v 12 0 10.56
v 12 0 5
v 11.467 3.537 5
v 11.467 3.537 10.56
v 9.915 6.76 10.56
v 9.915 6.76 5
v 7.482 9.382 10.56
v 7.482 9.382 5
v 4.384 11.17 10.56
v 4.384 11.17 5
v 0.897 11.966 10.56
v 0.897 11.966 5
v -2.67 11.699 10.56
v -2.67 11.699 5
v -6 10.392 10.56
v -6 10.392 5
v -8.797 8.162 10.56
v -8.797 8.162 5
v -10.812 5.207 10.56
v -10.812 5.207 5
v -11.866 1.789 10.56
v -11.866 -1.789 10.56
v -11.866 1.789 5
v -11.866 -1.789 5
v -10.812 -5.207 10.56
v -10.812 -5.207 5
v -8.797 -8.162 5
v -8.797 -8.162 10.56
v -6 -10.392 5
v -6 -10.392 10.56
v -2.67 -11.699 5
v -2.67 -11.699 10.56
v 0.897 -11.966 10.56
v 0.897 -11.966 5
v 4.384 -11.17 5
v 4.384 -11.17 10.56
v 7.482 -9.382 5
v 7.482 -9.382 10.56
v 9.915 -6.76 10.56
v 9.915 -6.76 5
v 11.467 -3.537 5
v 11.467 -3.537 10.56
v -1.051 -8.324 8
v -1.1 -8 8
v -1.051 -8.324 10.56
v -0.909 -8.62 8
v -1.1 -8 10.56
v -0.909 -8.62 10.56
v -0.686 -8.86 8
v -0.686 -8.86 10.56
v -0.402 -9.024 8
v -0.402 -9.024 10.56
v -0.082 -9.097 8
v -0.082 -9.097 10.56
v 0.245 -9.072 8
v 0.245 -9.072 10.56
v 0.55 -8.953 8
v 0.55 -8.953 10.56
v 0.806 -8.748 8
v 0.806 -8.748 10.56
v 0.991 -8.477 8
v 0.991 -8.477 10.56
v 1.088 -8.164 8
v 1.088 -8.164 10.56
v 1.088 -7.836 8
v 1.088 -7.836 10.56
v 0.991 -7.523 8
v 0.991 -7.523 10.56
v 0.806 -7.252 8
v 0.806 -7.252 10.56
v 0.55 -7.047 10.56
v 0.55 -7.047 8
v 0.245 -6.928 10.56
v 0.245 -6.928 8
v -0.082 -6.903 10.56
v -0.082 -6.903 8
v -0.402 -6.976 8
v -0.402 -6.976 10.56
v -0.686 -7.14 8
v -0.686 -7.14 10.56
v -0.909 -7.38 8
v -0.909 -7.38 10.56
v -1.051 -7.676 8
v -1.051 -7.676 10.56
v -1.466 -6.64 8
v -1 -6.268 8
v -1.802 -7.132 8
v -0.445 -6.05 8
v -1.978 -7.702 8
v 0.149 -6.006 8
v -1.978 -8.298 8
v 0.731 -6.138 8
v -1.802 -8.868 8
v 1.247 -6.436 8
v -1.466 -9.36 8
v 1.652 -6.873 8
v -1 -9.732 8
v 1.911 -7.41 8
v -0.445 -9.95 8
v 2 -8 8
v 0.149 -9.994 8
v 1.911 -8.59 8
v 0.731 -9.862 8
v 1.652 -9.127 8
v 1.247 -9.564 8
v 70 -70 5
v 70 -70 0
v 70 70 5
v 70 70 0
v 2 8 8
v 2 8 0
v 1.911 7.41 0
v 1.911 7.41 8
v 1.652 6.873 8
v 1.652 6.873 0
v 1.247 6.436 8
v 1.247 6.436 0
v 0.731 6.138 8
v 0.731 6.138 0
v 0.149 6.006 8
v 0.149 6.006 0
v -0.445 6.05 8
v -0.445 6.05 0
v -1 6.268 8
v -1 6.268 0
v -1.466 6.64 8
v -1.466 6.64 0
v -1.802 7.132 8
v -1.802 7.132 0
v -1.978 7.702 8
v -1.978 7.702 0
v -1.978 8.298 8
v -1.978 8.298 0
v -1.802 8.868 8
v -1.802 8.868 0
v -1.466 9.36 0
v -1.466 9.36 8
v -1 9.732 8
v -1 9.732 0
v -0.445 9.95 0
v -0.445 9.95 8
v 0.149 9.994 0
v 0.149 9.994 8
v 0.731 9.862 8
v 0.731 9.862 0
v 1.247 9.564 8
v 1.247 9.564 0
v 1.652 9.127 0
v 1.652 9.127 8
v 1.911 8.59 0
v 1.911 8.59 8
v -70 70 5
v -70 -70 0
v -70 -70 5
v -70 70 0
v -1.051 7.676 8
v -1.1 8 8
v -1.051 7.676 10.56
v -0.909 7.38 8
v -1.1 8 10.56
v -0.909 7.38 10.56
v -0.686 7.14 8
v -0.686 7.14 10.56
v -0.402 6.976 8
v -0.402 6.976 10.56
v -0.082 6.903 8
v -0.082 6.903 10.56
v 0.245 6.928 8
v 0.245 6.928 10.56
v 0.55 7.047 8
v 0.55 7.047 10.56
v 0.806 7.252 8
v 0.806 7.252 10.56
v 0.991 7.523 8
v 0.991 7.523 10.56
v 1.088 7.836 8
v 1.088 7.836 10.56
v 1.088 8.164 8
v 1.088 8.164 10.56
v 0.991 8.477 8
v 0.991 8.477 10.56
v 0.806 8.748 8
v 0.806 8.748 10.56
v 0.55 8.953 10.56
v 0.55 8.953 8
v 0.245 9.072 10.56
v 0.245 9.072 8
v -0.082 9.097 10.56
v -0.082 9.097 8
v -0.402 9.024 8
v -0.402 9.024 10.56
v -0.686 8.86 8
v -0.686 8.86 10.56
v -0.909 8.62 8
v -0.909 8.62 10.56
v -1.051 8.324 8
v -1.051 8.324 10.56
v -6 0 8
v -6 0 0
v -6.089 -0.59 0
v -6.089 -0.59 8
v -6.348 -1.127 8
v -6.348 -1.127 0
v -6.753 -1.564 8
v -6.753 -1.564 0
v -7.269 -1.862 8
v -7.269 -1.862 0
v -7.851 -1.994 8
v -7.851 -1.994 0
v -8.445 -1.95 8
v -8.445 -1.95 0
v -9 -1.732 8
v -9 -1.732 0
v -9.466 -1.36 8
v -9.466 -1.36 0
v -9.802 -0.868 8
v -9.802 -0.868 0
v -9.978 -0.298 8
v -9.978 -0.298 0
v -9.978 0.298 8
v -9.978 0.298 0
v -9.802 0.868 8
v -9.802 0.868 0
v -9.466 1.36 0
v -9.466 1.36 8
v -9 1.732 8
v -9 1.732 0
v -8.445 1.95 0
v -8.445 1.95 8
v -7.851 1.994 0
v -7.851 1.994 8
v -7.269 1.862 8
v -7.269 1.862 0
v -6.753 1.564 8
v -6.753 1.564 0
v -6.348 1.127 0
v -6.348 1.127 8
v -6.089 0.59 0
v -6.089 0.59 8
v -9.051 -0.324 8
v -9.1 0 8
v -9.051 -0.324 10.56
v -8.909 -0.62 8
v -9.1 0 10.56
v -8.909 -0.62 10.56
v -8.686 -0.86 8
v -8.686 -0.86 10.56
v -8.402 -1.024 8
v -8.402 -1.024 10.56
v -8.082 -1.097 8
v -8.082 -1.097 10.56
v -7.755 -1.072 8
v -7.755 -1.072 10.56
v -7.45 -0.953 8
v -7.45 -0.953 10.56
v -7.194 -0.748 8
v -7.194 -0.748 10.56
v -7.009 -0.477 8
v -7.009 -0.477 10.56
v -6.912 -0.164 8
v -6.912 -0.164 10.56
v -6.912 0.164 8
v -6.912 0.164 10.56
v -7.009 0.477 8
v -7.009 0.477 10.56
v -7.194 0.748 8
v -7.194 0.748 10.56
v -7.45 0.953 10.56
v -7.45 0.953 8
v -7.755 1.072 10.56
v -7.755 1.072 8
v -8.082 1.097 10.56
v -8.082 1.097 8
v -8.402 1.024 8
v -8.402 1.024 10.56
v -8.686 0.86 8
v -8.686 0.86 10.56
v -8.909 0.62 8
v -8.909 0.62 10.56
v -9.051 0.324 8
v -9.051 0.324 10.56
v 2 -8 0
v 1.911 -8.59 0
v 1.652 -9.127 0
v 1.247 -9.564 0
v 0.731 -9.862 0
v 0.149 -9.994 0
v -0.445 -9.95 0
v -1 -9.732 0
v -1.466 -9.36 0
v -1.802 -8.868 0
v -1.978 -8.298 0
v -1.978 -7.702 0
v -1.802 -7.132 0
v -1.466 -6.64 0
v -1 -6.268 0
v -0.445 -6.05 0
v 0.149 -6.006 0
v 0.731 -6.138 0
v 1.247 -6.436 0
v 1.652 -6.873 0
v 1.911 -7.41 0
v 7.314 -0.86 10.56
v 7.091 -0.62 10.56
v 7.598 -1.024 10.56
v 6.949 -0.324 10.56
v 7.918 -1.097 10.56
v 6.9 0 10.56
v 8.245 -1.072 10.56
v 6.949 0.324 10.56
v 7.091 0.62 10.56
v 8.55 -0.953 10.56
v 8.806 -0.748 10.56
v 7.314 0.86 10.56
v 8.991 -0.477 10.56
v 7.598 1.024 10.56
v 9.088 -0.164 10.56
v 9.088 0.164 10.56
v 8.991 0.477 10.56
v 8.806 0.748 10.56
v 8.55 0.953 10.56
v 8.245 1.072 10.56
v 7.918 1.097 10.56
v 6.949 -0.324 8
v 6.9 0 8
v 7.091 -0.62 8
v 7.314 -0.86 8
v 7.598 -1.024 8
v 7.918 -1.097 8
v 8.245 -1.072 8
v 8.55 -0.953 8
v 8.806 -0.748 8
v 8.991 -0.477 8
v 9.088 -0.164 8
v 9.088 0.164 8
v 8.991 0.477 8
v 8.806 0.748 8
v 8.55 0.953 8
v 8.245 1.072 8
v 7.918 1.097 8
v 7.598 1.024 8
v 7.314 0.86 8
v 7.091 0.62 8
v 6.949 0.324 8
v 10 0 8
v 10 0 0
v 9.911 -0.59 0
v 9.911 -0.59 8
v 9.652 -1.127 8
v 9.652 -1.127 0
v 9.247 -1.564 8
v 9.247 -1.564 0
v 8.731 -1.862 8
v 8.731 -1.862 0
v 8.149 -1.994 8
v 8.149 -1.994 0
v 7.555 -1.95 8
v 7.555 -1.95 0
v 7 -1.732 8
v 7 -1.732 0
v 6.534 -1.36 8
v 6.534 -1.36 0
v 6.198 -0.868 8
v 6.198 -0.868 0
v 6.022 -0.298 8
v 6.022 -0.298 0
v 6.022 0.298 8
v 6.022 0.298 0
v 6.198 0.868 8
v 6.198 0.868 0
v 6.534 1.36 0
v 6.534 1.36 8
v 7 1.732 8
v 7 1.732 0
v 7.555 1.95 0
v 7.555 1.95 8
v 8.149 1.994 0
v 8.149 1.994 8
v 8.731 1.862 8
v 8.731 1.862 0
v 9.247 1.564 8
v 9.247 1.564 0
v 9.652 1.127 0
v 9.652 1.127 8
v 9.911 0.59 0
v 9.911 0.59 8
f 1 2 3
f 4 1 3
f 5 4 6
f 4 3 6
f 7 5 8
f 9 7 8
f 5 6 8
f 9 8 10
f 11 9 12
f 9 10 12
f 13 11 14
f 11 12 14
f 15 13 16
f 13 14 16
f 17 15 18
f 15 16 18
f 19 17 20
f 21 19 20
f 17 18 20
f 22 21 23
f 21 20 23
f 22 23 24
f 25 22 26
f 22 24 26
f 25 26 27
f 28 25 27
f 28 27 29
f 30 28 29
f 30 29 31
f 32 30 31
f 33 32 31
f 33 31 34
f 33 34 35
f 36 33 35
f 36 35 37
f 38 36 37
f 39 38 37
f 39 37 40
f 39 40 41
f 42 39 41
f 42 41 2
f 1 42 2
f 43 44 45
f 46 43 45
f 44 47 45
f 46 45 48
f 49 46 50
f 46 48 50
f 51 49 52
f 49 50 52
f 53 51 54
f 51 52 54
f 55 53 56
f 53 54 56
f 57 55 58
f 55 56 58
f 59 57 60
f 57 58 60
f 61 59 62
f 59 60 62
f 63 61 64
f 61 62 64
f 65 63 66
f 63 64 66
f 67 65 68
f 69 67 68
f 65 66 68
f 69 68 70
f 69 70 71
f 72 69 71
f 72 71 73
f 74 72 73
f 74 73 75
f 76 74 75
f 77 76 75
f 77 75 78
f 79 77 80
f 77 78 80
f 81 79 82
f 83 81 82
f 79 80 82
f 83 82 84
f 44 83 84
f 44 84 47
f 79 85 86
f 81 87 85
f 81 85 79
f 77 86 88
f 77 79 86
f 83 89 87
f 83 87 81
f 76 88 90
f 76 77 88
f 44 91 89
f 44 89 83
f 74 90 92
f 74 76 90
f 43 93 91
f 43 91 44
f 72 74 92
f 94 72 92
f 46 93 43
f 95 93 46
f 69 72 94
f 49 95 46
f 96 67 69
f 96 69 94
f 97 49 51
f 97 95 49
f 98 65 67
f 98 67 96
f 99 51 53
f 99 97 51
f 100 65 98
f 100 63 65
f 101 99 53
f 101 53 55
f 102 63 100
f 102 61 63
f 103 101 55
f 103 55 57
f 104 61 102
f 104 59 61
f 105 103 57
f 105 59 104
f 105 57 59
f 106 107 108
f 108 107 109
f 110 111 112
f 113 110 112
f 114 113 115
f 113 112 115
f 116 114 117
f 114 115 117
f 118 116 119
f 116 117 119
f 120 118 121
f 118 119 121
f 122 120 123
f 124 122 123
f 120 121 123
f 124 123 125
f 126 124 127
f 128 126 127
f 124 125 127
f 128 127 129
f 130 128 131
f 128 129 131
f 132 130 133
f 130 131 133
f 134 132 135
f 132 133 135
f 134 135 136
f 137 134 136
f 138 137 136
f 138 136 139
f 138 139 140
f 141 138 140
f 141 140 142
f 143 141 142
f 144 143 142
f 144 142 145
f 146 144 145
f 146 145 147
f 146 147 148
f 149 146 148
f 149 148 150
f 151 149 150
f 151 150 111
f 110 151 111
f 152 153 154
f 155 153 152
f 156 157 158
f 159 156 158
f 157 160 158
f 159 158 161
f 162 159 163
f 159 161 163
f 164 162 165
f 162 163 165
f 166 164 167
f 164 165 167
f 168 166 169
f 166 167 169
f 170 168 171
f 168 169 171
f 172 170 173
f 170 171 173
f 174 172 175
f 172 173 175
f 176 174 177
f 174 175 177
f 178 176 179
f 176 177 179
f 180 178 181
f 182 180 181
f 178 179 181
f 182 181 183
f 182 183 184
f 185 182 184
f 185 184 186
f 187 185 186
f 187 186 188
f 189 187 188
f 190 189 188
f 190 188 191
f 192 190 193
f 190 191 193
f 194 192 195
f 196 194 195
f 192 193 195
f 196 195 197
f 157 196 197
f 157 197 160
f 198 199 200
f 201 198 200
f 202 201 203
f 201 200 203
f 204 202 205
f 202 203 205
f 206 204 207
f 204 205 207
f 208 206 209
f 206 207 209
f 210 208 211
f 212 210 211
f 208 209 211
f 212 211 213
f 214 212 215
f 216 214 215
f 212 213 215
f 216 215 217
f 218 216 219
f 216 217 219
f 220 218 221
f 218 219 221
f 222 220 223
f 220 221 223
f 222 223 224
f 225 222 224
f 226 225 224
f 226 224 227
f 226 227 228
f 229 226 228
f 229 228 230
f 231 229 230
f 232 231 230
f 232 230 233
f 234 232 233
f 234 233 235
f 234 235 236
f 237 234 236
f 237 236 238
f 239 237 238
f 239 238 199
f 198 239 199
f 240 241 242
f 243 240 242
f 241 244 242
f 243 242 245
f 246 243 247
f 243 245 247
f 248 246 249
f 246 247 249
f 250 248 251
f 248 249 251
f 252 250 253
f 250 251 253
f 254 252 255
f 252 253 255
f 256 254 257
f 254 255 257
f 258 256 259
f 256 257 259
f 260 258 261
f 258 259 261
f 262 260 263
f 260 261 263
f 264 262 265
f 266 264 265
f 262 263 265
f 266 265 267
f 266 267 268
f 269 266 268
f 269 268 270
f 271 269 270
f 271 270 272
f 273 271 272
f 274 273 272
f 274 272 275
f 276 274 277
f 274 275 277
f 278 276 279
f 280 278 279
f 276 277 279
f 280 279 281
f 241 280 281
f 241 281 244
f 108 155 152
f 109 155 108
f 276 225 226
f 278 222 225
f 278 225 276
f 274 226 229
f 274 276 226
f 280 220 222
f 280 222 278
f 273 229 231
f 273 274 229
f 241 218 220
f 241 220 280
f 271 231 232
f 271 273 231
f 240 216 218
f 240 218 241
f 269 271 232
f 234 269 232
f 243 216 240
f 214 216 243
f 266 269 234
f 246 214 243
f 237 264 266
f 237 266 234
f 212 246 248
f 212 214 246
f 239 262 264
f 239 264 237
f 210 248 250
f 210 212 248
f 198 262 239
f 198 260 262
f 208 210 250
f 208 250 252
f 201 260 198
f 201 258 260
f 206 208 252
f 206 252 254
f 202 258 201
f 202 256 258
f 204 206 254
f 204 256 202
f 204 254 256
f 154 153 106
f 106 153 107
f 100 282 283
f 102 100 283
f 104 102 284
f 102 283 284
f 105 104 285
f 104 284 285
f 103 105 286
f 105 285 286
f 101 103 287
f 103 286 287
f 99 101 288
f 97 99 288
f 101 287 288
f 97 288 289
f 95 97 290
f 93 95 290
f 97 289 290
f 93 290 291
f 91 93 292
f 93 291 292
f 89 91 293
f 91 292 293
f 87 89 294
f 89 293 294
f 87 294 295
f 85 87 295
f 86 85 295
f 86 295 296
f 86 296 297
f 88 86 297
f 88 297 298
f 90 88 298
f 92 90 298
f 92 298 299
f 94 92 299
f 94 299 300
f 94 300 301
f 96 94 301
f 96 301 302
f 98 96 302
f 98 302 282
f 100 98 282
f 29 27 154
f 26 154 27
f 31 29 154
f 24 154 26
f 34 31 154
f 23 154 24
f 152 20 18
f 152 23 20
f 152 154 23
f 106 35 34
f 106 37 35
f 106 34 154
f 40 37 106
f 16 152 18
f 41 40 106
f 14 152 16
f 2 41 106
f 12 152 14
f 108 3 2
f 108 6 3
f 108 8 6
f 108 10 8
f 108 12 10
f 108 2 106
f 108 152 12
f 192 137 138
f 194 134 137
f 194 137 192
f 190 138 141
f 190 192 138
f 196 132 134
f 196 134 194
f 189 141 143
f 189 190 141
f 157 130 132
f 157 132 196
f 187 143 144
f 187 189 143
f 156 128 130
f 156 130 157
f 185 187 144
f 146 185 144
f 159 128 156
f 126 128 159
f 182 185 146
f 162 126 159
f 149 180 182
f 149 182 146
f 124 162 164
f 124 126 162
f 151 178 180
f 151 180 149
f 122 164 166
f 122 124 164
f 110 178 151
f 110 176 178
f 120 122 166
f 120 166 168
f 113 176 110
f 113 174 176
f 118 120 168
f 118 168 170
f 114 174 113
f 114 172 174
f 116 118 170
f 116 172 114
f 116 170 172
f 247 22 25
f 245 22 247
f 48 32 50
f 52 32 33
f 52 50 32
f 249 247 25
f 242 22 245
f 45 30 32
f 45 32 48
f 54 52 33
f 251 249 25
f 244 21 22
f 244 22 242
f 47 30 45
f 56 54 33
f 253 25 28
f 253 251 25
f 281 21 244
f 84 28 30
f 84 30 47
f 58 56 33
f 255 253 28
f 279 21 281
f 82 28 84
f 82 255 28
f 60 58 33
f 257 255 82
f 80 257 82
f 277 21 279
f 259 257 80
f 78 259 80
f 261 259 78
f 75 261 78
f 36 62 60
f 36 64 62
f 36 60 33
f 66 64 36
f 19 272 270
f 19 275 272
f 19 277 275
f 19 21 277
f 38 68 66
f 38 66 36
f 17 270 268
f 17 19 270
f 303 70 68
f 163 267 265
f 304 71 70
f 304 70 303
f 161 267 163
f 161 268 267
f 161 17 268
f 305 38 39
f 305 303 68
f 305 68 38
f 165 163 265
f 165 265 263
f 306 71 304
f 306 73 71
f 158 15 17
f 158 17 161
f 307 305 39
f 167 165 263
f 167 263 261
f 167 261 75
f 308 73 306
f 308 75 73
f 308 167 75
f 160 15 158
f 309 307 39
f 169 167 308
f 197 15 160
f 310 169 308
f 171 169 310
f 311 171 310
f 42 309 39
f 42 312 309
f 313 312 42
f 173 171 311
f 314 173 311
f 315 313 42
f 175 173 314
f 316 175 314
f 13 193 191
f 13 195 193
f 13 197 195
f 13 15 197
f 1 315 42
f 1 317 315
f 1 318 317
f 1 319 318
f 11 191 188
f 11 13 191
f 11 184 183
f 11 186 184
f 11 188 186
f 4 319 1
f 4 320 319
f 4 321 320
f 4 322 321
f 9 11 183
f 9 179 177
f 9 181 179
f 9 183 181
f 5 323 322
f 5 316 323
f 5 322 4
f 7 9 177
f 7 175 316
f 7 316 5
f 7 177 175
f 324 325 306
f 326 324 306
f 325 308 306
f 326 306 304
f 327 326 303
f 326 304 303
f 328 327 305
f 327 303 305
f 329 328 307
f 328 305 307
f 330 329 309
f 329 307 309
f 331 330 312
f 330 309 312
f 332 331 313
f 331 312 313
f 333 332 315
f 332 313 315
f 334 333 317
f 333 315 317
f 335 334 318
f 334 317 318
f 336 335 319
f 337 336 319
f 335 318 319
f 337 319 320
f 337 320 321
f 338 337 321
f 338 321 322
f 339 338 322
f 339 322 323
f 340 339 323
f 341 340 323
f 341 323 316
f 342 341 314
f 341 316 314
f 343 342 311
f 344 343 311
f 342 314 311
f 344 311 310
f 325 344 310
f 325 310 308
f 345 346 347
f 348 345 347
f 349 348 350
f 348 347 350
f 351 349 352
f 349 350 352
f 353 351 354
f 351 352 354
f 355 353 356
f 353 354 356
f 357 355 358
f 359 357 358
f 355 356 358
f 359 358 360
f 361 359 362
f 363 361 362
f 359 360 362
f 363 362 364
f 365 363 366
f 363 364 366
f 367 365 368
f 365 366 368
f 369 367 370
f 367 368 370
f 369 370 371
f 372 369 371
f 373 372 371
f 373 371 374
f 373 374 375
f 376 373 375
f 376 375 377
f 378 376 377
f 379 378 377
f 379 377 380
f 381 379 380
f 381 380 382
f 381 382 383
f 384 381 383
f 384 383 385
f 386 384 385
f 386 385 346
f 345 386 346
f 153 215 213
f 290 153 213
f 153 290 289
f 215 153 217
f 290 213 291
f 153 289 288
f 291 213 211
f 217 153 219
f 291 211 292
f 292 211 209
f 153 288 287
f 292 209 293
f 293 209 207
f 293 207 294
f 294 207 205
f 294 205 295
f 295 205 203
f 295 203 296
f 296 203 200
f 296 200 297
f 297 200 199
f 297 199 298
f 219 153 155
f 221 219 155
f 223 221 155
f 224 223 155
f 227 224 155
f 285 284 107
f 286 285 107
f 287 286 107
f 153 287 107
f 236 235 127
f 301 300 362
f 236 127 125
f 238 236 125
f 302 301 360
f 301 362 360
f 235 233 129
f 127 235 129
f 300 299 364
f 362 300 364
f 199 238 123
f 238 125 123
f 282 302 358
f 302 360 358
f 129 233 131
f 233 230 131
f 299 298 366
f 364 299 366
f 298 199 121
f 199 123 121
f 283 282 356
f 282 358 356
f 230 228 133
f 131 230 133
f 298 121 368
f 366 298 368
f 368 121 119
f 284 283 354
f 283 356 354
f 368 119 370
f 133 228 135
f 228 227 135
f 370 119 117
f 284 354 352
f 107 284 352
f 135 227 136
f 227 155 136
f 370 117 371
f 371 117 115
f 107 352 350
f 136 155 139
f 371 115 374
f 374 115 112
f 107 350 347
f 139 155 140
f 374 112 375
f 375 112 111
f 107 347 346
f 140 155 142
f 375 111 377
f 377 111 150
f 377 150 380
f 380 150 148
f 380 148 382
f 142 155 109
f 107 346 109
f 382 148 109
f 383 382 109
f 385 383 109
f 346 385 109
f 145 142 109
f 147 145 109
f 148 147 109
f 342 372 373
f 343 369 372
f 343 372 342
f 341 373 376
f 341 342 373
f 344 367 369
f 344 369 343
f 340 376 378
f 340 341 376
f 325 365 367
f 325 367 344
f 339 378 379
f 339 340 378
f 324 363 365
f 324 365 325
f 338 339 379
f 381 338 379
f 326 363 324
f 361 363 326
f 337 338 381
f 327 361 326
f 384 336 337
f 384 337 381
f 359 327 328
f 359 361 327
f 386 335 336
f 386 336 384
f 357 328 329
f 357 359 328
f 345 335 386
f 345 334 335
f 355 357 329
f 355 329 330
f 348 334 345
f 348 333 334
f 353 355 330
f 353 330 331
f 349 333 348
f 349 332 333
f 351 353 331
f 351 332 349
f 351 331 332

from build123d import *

# Parameters (mm, degrees)
F0_W           = 140
F0_H           = 140
F0_R           = 12
F1_DEPTH       = 5
F2_DEPTH       = 10.56
F3_D           = 2.2
F3_DEPTH       = 12
F3_CBORE_D     = 4
F3_CBORE_DEPTH = 8
F3_TIP         = 0.6609466809


# Not quite as in the source:
# - a feature names something its author has since deleted; it is built from what else it names


with BuildPart() as f1:
    # F0 (on Top) → F1 (new body)
    with BuildSketch(Plane.XY):
        Rectangle(F0_W, F0_H)
        Circle(F0_R, mode=Mode.SUBTRACT)
    extrude(amount=F1_DEPTH)

    # F0 (on Top) → F2 (join)
    with BuildSketch(Plane.XY):
        Circle(F0_R)
    extrude(amount=F2_DEPTH)

    # F3
    with Locations(Plane(origin=(0, 0, 0), x_dir=(1, 0, 0), z_dir=(0, 0, -1))):
        with Locations((8, 0), (0, -8), (-8, 0), (0, 8)):
            CounterBoreHole(F3_D / 2, F3_CBORE_D / 2, F3_CBORE_DEPTH, depth=F3_DEPTH)
            with Locations((0, 0, -(F3_DEPTH + F3_TIP / 2))):  # 118° drill point
                Cone(0, F3_D / 2, F3_TIP, mode=Mode.SUBTRACT)


solid = f1.part
